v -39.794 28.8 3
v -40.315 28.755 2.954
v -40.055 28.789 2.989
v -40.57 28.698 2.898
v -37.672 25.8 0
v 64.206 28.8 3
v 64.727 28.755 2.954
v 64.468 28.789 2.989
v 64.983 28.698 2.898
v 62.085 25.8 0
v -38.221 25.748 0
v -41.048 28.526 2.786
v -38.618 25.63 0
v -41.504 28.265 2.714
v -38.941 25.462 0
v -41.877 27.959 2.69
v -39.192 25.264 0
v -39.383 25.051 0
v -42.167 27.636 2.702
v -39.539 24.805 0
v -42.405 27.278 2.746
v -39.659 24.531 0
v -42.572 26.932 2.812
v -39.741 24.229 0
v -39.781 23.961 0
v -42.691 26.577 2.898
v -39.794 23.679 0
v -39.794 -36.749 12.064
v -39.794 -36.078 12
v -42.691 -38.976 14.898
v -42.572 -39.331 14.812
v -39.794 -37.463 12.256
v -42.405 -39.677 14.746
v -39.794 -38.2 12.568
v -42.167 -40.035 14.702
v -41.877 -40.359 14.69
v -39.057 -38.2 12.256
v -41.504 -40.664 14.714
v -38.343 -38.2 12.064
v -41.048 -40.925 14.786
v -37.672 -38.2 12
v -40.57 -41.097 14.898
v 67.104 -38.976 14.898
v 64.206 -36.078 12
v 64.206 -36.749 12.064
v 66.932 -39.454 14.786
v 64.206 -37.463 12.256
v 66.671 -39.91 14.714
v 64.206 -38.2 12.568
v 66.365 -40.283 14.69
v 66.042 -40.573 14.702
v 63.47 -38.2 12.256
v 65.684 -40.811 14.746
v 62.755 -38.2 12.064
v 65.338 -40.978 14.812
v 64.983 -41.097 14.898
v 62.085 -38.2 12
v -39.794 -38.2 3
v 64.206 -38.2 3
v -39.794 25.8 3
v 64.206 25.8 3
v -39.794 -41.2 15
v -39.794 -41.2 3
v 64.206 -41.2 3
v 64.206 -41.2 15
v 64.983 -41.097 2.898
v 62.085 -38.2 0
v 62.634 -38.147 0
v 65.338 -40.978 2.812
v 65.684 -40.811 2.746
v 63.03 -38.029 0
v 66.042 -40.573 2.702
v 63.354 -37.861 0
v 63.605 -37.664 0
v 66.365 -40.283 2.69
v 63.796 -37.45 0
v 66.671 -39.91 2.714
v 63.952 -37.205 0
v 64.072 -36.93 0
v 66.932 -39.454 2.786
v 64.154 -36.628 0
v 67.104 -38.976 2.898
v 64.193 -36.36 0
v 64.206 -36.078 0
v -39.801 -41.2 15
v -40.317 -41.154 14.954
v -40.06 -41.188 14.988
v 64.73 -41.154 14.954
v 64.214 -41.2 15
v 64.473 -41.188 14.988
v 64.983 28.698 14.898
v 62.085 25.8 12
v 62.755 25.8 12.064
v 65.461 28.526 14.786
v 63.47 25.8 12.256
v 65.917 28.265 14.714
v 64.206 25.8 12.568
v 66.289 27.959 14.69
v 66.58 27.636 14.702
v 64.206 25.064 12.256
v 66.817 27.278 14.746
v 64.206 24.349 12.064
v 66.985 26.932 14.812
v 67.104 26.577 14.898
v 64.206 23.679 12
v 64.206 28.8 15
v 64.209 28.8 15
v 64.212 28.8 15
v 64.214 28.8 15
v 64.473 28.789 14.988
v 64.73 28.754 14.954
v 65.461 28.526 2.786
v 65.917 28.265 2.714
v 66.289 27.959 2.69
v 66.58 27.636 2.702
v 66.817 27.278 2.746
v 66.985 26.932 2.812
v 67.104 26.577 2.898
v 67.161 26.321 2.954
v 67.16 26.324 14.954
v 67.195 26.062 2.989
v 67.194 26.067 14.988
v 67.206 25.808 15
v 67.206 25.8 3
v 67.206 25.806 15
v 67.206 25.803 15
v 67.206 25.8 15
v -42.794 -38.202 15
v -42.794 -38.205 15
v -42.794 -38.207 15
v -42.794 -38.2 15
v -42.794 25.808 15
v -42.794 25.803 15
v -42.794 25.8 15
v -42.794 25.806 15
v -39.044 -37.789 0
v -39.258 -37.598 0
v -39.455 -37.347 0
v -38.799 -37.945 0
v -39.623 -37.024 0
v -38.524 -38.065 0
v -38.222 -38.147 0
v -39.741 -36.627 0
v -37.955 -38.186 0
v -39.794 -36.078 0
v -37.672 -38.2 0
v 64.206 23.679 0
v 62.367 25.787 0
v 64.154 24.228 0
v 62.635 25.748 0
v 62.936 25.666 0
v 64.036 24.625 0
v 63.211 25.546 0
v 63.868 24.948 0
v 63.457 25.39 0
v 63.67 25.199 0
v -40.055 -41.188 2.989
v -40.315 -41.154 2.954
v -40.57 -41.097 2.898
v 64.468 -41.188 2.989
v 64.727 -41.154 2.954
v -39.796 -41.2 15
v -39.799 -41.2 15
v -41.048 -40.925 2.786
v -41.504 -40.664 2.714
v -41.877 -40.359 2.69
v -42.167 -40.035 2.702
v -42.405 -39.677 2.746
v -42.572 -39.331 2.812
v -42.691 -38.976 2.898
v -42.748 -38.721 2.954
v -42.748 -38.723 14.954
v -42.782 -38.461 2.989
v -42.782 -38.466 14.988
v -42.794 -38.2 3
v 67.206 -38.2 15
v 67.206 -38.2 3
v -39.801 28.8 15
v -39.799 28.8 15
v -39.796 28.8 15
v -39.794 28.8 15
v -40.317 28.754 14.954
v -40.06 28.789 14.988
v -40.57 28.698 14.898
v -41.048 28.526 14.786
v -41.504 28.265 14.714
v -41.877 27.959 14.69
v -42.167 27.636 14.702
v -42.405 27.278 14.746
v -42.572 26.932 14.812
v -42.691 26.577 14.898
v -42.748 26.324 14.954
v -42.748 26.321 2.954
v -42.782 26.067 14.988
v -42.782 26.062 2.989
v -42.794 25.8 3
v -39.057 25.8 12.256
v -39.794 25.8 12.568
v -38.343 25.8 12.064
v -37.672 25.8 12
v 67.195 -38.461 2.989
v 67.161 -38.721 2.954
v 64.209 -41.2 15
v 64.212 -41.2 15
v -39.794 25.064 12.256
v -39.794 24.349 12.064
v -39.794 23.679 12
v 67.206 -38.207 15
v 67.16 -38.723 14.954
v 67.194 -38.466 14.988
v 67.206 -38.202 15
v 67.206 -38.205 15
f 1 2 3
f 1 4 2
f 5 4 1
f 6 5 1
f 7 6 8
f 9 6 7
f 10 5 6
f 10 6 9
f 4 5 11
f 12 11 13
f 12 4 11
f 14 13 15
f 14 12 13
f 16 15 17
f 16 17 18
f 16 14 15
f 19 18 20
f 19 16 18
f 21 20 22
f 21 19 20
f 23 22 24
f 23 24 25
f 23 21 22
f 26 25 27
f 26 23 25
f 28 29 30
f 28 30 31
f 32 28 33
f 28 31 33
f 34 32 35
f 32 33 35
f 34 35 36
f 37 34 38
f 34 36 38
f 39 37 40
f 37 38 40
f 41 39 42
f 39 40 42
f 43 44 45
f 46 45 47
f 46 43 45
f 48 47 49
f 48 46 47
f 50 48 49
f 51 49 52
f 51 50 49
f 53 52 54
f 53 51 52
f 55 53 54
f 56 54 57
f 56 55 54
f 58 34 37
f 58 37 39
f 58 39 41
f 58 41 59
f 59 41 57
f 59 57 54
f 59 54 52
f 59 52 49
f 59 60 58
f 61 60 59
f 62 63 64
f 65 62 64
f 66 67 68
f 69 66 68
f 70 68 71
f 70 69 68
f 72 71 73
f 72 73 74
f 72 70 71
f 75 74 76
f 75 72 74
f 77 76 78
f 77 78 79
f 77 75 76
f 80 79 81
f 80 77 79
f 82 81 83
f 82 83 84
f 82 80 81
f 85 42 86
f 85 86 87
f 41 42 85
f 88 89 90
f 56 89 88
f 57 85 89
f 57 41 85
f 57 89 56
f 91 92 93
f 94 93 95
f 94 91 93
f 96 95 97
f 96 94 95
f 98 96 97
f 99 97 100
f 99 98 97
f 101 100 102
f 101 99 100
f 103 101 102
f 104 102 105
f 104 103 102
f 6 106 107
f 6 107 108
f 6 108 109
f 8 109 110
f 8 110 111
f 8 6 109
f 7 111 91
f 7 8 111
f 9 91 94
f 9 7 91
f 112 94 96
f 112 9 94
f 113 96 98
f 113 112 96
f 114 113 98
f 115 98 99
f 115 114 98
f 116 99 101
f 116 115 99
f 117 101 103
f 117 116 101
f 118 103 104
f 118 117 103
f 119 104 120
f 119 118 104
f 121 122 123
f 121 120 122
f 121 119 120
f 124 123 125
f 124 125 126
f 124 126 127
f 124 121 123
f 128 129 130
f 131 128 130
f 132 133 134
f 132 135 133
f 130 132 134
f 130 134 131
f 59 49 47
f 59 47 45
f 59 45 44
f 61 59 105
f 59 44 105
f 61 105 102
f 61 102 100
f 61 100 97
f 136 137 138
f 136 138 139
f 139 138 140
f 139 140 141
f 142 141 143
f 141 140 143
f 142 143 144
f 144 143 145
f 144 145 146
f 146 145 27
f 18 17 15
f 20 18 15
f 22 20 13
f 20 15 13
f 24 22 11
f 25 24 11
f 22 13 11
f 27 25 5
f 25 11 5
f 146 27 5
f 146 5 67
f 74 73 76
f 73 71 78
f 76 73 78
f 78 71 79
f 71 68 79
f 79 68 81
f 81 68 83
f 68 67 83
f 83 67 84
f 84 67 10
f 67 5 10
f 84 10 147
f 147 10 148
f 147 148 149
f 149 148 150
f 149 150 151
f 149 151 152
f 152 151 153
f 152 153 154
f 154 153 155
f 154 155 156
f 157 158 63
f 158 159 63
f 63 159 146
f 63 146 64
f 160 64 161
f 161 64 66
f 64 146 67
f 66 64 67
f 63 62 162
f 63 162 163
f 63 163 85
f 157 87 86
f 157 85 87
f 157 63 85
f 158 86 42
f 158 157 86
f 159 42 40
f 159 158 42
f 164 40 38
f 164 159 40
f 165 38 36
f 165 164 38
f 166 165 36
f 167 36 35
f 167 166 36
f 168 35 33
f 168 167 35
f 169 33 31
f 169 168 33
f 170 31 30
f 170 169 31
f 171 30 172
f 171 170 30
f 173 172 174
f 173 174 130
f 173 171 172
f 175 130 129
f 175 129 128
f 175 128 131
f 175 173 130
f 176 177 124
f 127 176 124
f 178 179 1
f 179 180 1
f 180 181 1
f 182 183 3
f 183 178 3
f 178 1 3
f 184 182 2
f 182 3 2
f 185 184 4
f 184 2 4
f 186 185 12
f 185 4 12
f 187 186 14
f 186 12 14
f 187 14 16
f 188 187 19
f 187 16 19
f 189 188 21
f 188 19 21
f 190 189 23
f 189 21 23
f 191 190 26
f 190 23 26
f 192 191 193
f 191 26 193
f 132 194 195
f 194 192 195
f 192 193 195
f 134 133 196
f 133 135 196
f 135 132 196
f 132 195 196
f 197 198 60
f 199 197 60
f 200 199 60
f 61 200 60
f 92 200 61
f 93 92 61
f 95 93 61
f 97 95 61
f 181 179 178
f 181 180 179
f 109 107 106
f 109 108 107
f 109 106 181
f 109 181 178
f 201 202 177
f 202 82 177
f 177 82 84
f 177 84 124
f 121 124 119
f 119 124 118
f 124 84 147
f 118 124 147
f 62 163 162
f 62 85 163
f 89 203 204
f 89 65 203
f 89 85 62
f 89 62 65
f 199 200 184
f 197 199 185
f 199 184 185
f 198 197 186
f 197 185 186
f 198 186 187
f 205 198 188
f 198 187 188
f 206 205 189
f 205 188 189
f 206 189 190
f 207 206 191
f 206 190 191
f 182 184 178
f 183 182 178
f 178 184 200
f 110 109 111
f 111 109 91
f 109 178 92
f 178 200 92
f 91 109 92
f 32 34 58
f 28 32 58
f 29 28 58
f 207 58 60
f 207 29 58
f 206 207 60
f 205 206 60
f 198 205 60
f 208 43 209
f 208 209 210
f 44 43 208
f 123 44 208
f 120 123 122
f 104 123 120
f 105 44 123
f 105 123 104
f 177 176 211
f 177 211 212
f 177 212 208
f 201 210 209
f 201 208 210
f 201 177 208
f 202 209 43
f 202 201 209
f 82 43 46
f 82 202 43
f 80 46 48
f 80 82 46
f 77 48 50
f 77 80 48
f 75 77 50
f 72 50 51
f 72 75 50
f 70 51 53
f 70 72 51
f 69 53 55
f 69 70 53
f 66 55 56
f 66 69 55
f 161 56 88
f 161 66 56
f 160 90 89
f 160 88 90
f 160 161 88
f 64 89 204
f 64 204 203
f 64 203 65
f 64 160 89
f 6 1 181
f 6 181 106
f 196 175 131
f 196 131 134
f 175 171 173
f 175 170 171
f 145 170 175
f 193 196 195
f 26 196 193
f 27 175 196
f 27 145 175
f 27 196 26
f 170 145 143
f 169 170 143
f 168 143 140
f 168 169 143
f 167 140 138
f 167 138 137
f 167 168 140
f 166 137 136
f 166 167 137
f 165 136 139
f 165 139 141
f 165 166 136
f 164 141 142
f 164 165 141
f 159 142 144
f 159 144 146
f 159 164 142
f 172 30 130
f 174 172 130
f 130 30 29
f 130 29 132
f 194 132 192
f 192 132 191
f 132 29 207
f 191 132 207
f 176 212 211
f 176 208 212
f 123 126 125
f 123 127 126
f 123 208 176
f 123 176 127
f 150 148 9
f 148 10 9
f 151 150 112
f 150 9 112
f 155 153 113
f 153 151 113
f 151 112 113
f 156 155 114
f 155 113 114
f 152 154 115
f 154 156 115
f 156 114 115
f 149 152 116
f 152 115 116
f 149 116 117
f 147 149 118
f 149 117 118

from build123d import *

# Parameters (mm, degrees)
F0_W         = 110
F0_H         = 70
F1_DEPTH     = 15
F2_T         = -3
F3_SIZE      = 3
F4_SIZE      = 2.99999
F5_T4_DEPTH  = 13.85638914
F5_T11_DEPTH = 13.85638914
F5_T17_DEPTH = 13.85638914
F5_T23_DEPTH = 13.85638914
F5_T30_DEPTH = 13.85638914
F5_T36_DEPTH = 13.85638914
F5_T42_DEPTH = 13.85638914
F5_T49_DEPTH = 13.85638914
F5_T55_DEPTH = 13.85638914
F5_T61_DEPTH = 13.85638914
F5_T68_DEPTH = 13.85638914
F5_T74_DEPTH = 13.85638914
F5_T77_DEPTH = 27
F5_T79_DEPTH = 13.8564064606
F5_T81_DEPTH = 13.8564064606
F5_T83_DEPTH = 13.8564064606
F5_T85_DEPTH = 13.8564064606


# Not quite as in the source:
# - a fillet or chamfer that OpenCascade refuses, or shapes differently, is made with other operations: its cross-section is extruded or revolved along the edge and cut away or added
# - a fillet or chamfer is up to 0.001 mm smaller than in the source, because OpenCascade refuses the exact size


with BuildPart() as f1:
    # F0 (on Top) → F1 (new body)
    with BuildSketch(Plane.XY):
        with Locations((12.2063489258, -6.1995962761)):
            Rectangle(F0_W, F0_H)
    extrude(amount=F1_DEPTH)

    # F2
    f2_openings = [f1.faces().sort_by_distance(p)[0] for p in [
        (12.206349, -6.199596, 15),
    ]]
    offset(amount=F2_T, openings=f2_openings)

    # F3
    f3_edges = [f1.edges().sort_by_distance(p)[0] for p in [
        (-42.793651, -6.199596, 0),
        (12.206349, -41.199596, 0),
        (67.206349, -6.199596, 0),
        (12.206349, 28.800404, 0),
    ]]
    chamfer(f3_edges, length=F3_SIZE)

    # F4 (size 3 in the source; OpenCascade refuses exactly that, so slightly less here)
    f4_edges = [f1.edges().sort_by_distance(p)[0] for p in [
        (12.206349, 25.800404, 15),
        (-39.793651, -6.199596, 15),
        (64.206349, -6.199596, 15),
        (12.206349, -38.199596, 15),
    ]]
    chamfer(f4_edges, length=F4_SIZE)

    # F5: fillet of radius 3 on 12 edges, made by hand


with BuildPart() as f5_tool2:
    # F5_s3 → F5_t4 (new body)
    with BuildSketch(Plane(origin=(43.6353084006, -43.6353084006, 43.6353084006), x_dir=(-0.7071067812, -0.7071067812, 0), z_dir=(-0.5773502692, 0.5773502692, -0.5773502692))):
        with BuildLine():
            ThreePointArc((-19.8895511553, -31.1430595221), (-18.3895511553, -31.5449833108), (-16.8895511553, -31.1430595221))
            Line((-16.8895511553, -31.1430595221), (-18.3895511553, -32.0090849259))
            Line((-18.3895511553, -32.0090849259), (-19.8895511553, -31.1430595221))
        make_face()
    extrude(amount=F5_T4_DEPTH)

    split(bisect_by=Plane.XY.offset(15), keep=Keep.BOTTOM)

    split(bisect_by=Plane.YZ.offset(64.2063489258), keep=Keep.TOP)

    split(bisect_by=Plane.XZ.offset(38.1995962761), keep=Keep.TOP)


with BuildPart() as f1_1:
    add(f1.part)

    # F5_t1: union F5_tool2
    add(f5_tool2.part)


with BuildPart() as f5_tool9:
    # F5_s10 → F5_t11 (new body)
    with BuildSketch(Plane(origin=(43.6353084006, -43.6353084006, 43.6353084006), x_dir=(-0.7071067812, -0.7071067812, 0), z_dir=(-0.5773502692, 0.5773502692, -0.5773502692))):
        with BuildLine():
            ThreePointArc((-19.8895511553, -31.1430595221), (-18.3895511553, -31.5449833108), (-16.8895511553, -31.1430595221))
            Line((-16.8895511553, -31.1430595221), (-18.3895511553, -32.0090849259))
            Line((-18.3895511553, -32.0090849259), (-19.8895511553, -31.1430595221))
        make_face()
    extrude(amount=F5_T11_DEPTH)

    split(bisect_by=Plane.YZ.offset(64.2063489258), keep=Keep.BOTTOM)

    split(bisect_by=Plane.XZ.offset(38.1995962761), keep=Keep.TOP)


with BuildPart() as f1_2:
    add(f1_1.part)

    # F5_t8: union F5_tool9
    add(f5_tool9.part)


with BuildPart() as f5_tool15:
    # F5_s16 → F5_t17 (new body)
    with BuildSketch(Plane(origin=(43.6353084006, -43.6353084006, 43.6353084006), x_dir=(-0.7071067812, -0.7071067812, 0), z_dir=(-0.5773502692, 0.5773502692, -0.5773502692))):
        with BuildLine():
            ThreePointArc((-19.8895511553, -31.1430595221), (-18.3895511553, -31.5449833108), (-16.8895511553, -31.1430595221))
            Line((-16.8895511553, -31.1430595221), (-18.3895511553, -32.0090849259))
            Line((-18.3895511553, -32.0090849259), (-19.8895511553, -31.1430595221))
        make_face()
    extrude(amount=F5_T17_DEPTH)

    split(bisect_by=Plane.YZ.offset(64.2063489258), keep=Keep.TOP)

    split(bisect_by=Plane.XZ.offset(38.1995962761), keep=Keep.BOTTOM)


with BuildPart() as f1_3:
    add(f1_2.part)

    # F5_t14: union F5_tool15
    add(f5_tool15.part)


with BuildPart() as f5_tool21:
    # F5_s22 → F5_t23 (new body)
    with BuildSketch(Plane(origin=(-35.4977424501, -35.4977424501, 35.4977424501), x_dir=(-0.7071067812, 0.7071067812, 0), z_dir=(0.5773502692, 0.5773502692, -0.5773502692))):
        with BuildLine():
            ThreePointArc((2.6271669573, -21.1766173586), (1.1271669573, -21.5785411472), (-0.3728330427, -21.1766173586))
            Line((-0.3728330427, -21.1766173586), (1.1271669573, -22.0426427624))
            Line((1.1271669573, -22.0426427624), (2.6271669573, -21.1766173586))
        make_face()
    extrude(amount=F5_T23_DEPTH)

    split(bisect_by=Plane.XY.offset(15), keep=Keep.BOTTOM)

    split(bisect_by=Plane.YZ.offset(-39.7936510742), keep=Keep.BOTTOM)

    split(bisect_by=Plane.XZ.offset(38.1995962761), keep=Keep.TOP)


with BuildPart() as f1_4:
    add(f1_3.part)

    # F5_t20: union F5_tool21
    add(f5_tool21.part)


with BuildPart() as f5_tool28:
    # F5_s29 → F5_t30 (new body)
    with BuildSketch(Plane(origin=(-35.4977424501, -35.4977424501, 35.4977424501), x_dir=(-0.7071067812, 0.7071067812, 0), z_dir=(0.5773502692, 0.5773502692, -0.5773502692))):
        with BuildLine():
            ThreePointArc((2.6271669573, -21.1766173586), (1.1271669573, -21.5785411472), (-0.3728330427, -21.1766173586))
            Line((-0.3728330427, -21.1766173586), (1.1271669573, -22.0426427624))
            Line((1.1271669573, -22.0426427624), (2.6271669573, -21.1766173586))
        make_face()
    extrude(amount=F5_T30_DEPTH)

    split(bisect_by=Plane.YZ.offset(-39.7936510742), keep=Keep.TOP)

    split(bisect_by=Plane.XZ.offset(38.1995962761), keep=Keep.TOP)


with BuildPart() as f1_5:
    add(f1_4.part)

    # F5_t27: union F5_tool28
    add(f5_tool28.part)


with BuildPart() as f5_tool34:
    # F5_s35 → F5_t36 (new body)
    with BuildSketch(Plane(origin=(-35.4977424501, -35.4977424501, 35.4977424501), x_dir=(-0.7071067812, 0.7071067812, 0), z_dir=(0.5773502692, 0.5773502692, -0.5773502692))):
        with BuildLine():
            ThreePointArc((2.6271669573, -21.1766173586), (1.1271669573, -21.5785411472), (-0.3728330427, -21.1766173586))
            Line((-0.3728330427, -21.1766173586), (1.1271669573, -22.0426427624))
            Line((1.1271669573, -22.0426427624), (2.6271669573, -21.1766173586))
        make_face()
    extrude(amount=F5_T36_DEPTH)

    split(bisect_by=Plane.YZ.offset(-39.7936510742), keep=Keep.BOTTOM)

    split(bisect_by=Plane.XZ.offset(38.1995962761), keep=Keep.BOTTOM)


with BuildPart() as f1_6:
    add(f1_5.part)

    # F5_t33: union F5_tool34
    add(f5_tool34.part)


with BuildPart() as f5_tool40:
    # F5_s41 → F5_t42 (new body)
    with BuildSketch(Plane(origin=(-31.364678266, 31.364678266, 31.364678266), x_dir=(0.7071067812, 0.7071067812, 0), z_dir=(0.5773502692, -0.5773502692, -0.5773502692))):
        with BuildLine():
            ThreePointArc((-8.3947200922, -16.114668196), (-9.8947200922, -16.5165919847), (-11.3947200922, -16.114668196))
            Line((-11.3947200922, -16.114668196), (-9.8947200922, -16.9806935998))
            Line((-9.8947200922, -16.9806935998), (-8.3947200922, -16.114668196))
        make_face()
    extrude(amount=F5_T42_DEPTH)

    split(bisect_by=Plane.XY.offset(15), keep=Keep.BOTTOM)

    split(bisect_by=Plane.XZ.offset(-25.8004037239), keep=Keep.BOTTOM)

    split(bisect_by=Plane.YZ.offset(-39.7936510742), keep=Keep.BOTTOM)


with BuildPart() as f1_7:
    add(f1_6.part)

    # F5_t39: union F5_tool40
    add(f5_tool40.part)


with BuildPart() as f5_tool47:
    # F5_s48 → F5_t49 (new body)
    with BuildSketch(Plane(origin=(-31.364678266, 31.364678266, 31.364678266), x_dir=(0.7071067812, 0.7071067812, 0), z_dir=(0.5773502692, -0.5773502692, -0.5773502692))):
        with BuildLine():
            ThreePointArc((-8.3947200922, -16.114668196), (-9.8947200922, -16.5165919847), (-11.3947200922, -16.114668196))
            Line((-11.3947200922, -16.114668196), (-9.8947200922, -16.9806935998))
            Line((-9.8947200922, -16.9806935998), (-8.3947200922, -16.114668196))
        make_face()
    extrude(amount=F5_T49_DEPTH)

    split(bisect_by=Plane.XZ.offset(-25.8004037239), keep=Keep.TOP)

    split(bisect_by=Plane.YZ.offset(-39.7936510742), keep=Keep.BOTTOM)


with BuildPart() as f1_8:
    add(f1_7.part)

    # F5_t46: union F5_tool47
    add(f5_tool47.part)


with BuildPart() as f5_tool53:
    # F5_s54 → F5_t55 (new body)
    with BuildSketch(Plane(origin=(-31.364678266, 31.364678266, 31.364678266), x_dir=(0.7071067812, 0.7071067812, 0), z_dir=(0.5773502692, -0.5773502692, -0.5773502692))):
        with BuildLine():
            ThreePointArc((-8.3947200922, -16.114668196), (-9.8947200922, -16.5165919847), (-11.3947200922, -16.114668196))
            Line((-11.3947200922, -16.114668196), (-9.8947200922, -16.9806935998))
            Line((-9.8947200922, -16.9806935998), (-8.3947200922, -16.114668196))
        make_face()
    extrude(amount=F5_T55_DEPTH)

    split(bisect_by=Plane.XZ.offset(-25.8004037239), keep=Keep.BOTTOM)

    split(bisect_by=Plane.YZ.offset(-39.7936510742), keep=Keep.TOP)


with BuildPart() as f1_9:
    add(f1_8.part)

    # F5_t52: union F5_tool53
    add(f5_tool53.part)


with BuildPart() as f5_tool59:
    # F5_s60 → F5_t61 (new body)
    with BuildSketch(Plane(origin=(39.5022442166, 39.5022442166, 39.5022442166), x_dir=(0.7071067812, -0.7071067812, 0), z_dir=(-0.5773502692, -0.5773502692, -0.5773502692))):
        with BuildLine():
            ThreePointArc((25.6571042902, -26.0811103596), (27.1571042902, -26.4830341482), (28.6571042902, -26.0811103596))
            Line((28.6571042902, -26.0811103596), (27.1571042902, -26.9471357634))
            Line((27.1571042902, -26.9471357634), (25.6571042902, -26.0811103596))
        make_face()
    extrude(amount=F5_T61_DEPTH)

    split(bisect_by=Plane.XY.offset(15), keep=Keep.BOTTOM)

    split(bisect_by=Plane.XZ.offset(-25.8004037239), keep=Keep.BOTTOM)

    split(bisect_by=Plane.YZ.offset(64.2063489258), keep=Keep.TOP)


with BuildPart() as f1_10:
    add(f1_9.part)

    # F5_t58: union F5_tool59
    add(f5_tool59.part)


with BuildPart() as f5_tool66:
    # F5_s67 → F5_t68 (new body)
    with BuildSketch(Plane(origin=(39.5022442166, 39.5022442166, 39.5022442166), x_dir=(0.7071067812, -0.7071067812, 0), z_dir=(-0.5773502692, -0.5773502692, -0.5773502692))):
        with BuildLine():
            ThreePointArc((25.6571042902, -26.0811103596), (27.1571042902, -26.4830341482), (28.6571042902, -26.0811103596))
            Line((28.6571042902, -26.0811103596), (27.1571042902, -26.9471357634))
            Line((27.1571042902, -26.9471357634), (25.6571042902, -26.0811103596))
        make_face()
    extrude(amount=F5_T68_DEPTH)

    split(bisect_by=Plane.XZ.offset(-25.8004037239), keep=Keep.TOP)

    split(bisect_by=Plane.YZ.offset(64.2063489258), keep=Keep.TOP)


with BuildPart() as f1_11:
    add(f1_10.part)

    # F5_t65: union F5_tool66
    add(f5_tool66.part)


with BuildPart() as f5_tool72:
    # F5_s73 → F5_t74 (new body)
    with BuildSketch(Plane(origin=(39.5022442166, 39.5022442166, 39.5022442166), x_dir=(0.7071067812, -0.7071067812, 0), z_dir=(-0.5773502692, -0.5773502692, -0.5773502692))):
        with BuildLine():
            ThreePointArc((25.6571042902, -26.0811103596), (27.1571042902, -26.4830341482), (28.6571042902, -26.0811103596))
            Line((28.6571042902, -26.0811103596), (27.1571042902, -26.9471357634))
            Line((27.1571042902, -26.9471357634), (25.6571042902, -26.0811103596))
        make_face()
    extrude(amount=F5_T74_DEPTH)

    split(bisect_by=Plane.XZ.offset(-25.8004037239), keep=Keep.BOTTOM)

    split(bisect_by=Plane.YZ.offset(64.2063489258), keep=Keep.BOTTOM)


with BuildPart() as f1_12:
    add(f1_11.part)

    # F5_t71: union F5_tool72
    add(f5_tool72.part)

    # F5_s78 → F5_t77 (cut)
    with BuildSketch(Plane.XY.offset(-4.5)):
        with BuildLine():
            ThreePointArc((67.2063489258, -38.1995962761), (66.3276692694, -40.3209166197), (64.2063489258, -41.1995962761))
            Line((64.2063489258, -41.1995962761), (67.2063489258, -41.1995962761))
            Line((67.2063489258, -41.1995962761), (67.2063489258, -38.1995962761))
        make_face()
        with BuildLine():
            ThreePointArc((-39.7936510742, -41.1995962761), (-41.9149714177, -40.3209166197), (-42.7936510742, -38.1995962761))
            Line((-42.7936510742, -38.1995962761), (-42.7936510742, -41.1995962761))
            Line((-42.7936510742, -41.1995962761), (-39.7936510742, -41.1995962761))
        make_face()
        with BuildLine():
            ThreePointArc((64.2063489258, 28.8004037239), (66.3276692694, 27.9217240674), (67.2063489258, 25.8004037239))
            Line((67.2063489258, 25.8004037239), (67.2063489258, 28.8004037239))
            Line((67.2063489258, 28.8004037239), (64.2063489258, 28.8004037239))
        make_face()
        with BuildLine():
            ThreePointArc((-39.7936510742, 28.8004037239), (-41.9149714177, 27.9217240674), (-42.7936510742, 25.8004037239))
            Line((-42.7936510742, 25.8004037239), (-42.7936510742, 28.8004037239))
            Line((-42.7936510742, 28.8004037239), (-39.7936510742, 28.8004037239))
        make_face()
    extrude(amount=F5_T77_DEPTH, mode=Mode.SUBTRACT)

    # F5_s80 → F5_t79 (cut)
    with BuildSketch(Plane(origin=(-31.4977491168, -31.4977491168, 31.4977491168), x_dir=(-0.7071067812, 0.7071067812, 0), z_dir=(0.5773502692, 0.5773502692, -0.5773502692))):
        with BuildLine():
            ThreePointArc((2.6271669573, -30.9745844947), (1.1271669573, -31.3765082833), (-0.3728330427, -30.9745844947))
            Line((-0.3728330427, -30.9745844947), (1.1271669573, -31.8406098985))
            Line((1.1271669573, -31.8406098985), (2.6271669573, -30.9745844947))
        make_face()
    extrude(amount=F5_T79_DEPTH, mode=Mode.SUBTRACT)

    # F5_s82 → F5_t81 (cut)
    with BuildSketch(Plane(origin=(-27.3646849327, 27.3646849327, 27.3646849327), x_dir=(0.7071067812, 0.7071067812, 0), z_dir=(0.5773502692, -0.5773502692, -0.5773502692))):
        with BuildLine():
            ThreePointArc((-8.3947200922, -25.9126353321), (-9.8947200922, -26.3145591208), (-11.3947200922, -25.9126353321))
            Line((-11.3947200922, -25.9126353321), (-9.8947200922, -26.7786607359))
            Line((-9.8947200922, -26.7786607359), (-8.3947200922, -25.9126353321))
        make_face()
    extrude(amount=F5_T81_DEPTH, mode=Mode.SUBTRACT)

    # F5_s84 → F5_t83 (cut)
    with BuildSketch(Plane(origin=(39.6353150673, -39.6353150673, 39.6353150673), x_dir=(-0.7071067812, -0.7071067812, 0), z_dir=(-0.5773502692, 0.5773502692, -0.5773502692))):
        with BuildLine():
            ThreePointArc((-16.8895511553, -40.9410266582), (-18.3895511553, -41.3429504469), (-19.8895511553, -40.9410266582))
            Line((-19.8895511553, -40.9410266582), (-18.3895511553, -41.807052062))
            Line((-18.3895511553, -41.807052062), (-16.8895511553, -40.9410266582))
        make_face()
    extrude(amount=F5_T83_DEPTH, mode=Mode.SUBTRACT)

    # F5_s86 → F5_t85 (cut)
    with BuildSketch(Plane(origin=(35.5022508832, 35.5022508832, 35.5022508832), x_dir=(0.7071067812, -0.7071067812, 0), z_dir=(-0.5773502692, -0.5773502692, -0.5773502692))):
        with BuildLine():
            ThreePointArc((25.6571042902, -35.8790774957), (27.1571042902, -36.2810012843), (28.6571042902, -35.8790774957))
            Line((28.6571042902, -35.8790774957), (27.1571042902, -36.7451028995))
            Line((27.1571042902, -36.7451028995), (25.6571042902, -35.8790774957))
        make_face()
    extrude(amount=F5_T85_DEPTH, mode=Mode.SUBTRACT)


solid = f1_12.part
